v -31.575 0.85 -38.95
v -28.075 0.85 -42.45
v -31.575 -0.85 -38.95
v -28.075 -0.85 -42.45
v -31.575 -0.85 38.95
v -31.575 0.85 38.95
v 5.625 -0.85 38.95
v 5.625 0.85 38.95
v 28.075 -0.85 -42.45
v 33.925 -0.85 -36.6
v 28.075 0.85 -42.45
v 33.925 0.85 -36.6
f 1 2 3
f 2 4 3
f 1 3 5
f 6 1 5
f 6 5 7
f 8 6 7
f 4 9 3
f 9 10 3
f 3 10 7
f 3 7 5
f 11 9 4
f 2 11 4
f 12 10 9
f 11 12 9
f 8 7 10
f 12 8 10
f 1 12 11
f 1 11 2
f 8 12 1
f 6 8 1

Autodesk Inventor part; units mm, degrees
ref_plane "YZ Plane" through (0, 0, 0) normal (1, 0, 0) x (0, 1, 0)
ref_plane "XZ Plane" through (0, 0, 0) normal (0, 1, 0) x (-1, 0, 0)
ref_plane "XY Plane" through (0, 0, 0) normal (0, 0, 1) x (1, 0, 0)
sketch "Sketch1" plane through (0, 0, 0) normal (0, 1, 0) x (-1, 0, 0)
  line L0 (31.575, 38.95) -> (-5.625, 38.95)
  line L1 (-5.625, 38.95) -> (-33.925, -36.6)
  line L2 (-33.925, -36.6) -> (-28.075, -42.45)
  line L3 (-28.075, -42.45) -> (28.075, -42.45)
  line L4 (28.075, -42.45) -> (31.575, -38.95)
  line L5 (31.575, -38.95) -> (31.575, 38.95)
  point P0 (0, 0)
  point P1 (0, -42.45)
  point P2 (31.575, 0)
  dimension "d0" = 3.5
  dimension "d1" = 3.5
  dimension "d2" = 81.4
  dimension "d3" = 37.2
  dimension "d4" = 65.5
  dimension "d5" = 59.65
extrude "Extrusion1" add sketch "Sketch1" along normal mid plane 1.7
equation "\"d1\" = d0"
properties part number "StrategyCard_Single" material "Paper"
